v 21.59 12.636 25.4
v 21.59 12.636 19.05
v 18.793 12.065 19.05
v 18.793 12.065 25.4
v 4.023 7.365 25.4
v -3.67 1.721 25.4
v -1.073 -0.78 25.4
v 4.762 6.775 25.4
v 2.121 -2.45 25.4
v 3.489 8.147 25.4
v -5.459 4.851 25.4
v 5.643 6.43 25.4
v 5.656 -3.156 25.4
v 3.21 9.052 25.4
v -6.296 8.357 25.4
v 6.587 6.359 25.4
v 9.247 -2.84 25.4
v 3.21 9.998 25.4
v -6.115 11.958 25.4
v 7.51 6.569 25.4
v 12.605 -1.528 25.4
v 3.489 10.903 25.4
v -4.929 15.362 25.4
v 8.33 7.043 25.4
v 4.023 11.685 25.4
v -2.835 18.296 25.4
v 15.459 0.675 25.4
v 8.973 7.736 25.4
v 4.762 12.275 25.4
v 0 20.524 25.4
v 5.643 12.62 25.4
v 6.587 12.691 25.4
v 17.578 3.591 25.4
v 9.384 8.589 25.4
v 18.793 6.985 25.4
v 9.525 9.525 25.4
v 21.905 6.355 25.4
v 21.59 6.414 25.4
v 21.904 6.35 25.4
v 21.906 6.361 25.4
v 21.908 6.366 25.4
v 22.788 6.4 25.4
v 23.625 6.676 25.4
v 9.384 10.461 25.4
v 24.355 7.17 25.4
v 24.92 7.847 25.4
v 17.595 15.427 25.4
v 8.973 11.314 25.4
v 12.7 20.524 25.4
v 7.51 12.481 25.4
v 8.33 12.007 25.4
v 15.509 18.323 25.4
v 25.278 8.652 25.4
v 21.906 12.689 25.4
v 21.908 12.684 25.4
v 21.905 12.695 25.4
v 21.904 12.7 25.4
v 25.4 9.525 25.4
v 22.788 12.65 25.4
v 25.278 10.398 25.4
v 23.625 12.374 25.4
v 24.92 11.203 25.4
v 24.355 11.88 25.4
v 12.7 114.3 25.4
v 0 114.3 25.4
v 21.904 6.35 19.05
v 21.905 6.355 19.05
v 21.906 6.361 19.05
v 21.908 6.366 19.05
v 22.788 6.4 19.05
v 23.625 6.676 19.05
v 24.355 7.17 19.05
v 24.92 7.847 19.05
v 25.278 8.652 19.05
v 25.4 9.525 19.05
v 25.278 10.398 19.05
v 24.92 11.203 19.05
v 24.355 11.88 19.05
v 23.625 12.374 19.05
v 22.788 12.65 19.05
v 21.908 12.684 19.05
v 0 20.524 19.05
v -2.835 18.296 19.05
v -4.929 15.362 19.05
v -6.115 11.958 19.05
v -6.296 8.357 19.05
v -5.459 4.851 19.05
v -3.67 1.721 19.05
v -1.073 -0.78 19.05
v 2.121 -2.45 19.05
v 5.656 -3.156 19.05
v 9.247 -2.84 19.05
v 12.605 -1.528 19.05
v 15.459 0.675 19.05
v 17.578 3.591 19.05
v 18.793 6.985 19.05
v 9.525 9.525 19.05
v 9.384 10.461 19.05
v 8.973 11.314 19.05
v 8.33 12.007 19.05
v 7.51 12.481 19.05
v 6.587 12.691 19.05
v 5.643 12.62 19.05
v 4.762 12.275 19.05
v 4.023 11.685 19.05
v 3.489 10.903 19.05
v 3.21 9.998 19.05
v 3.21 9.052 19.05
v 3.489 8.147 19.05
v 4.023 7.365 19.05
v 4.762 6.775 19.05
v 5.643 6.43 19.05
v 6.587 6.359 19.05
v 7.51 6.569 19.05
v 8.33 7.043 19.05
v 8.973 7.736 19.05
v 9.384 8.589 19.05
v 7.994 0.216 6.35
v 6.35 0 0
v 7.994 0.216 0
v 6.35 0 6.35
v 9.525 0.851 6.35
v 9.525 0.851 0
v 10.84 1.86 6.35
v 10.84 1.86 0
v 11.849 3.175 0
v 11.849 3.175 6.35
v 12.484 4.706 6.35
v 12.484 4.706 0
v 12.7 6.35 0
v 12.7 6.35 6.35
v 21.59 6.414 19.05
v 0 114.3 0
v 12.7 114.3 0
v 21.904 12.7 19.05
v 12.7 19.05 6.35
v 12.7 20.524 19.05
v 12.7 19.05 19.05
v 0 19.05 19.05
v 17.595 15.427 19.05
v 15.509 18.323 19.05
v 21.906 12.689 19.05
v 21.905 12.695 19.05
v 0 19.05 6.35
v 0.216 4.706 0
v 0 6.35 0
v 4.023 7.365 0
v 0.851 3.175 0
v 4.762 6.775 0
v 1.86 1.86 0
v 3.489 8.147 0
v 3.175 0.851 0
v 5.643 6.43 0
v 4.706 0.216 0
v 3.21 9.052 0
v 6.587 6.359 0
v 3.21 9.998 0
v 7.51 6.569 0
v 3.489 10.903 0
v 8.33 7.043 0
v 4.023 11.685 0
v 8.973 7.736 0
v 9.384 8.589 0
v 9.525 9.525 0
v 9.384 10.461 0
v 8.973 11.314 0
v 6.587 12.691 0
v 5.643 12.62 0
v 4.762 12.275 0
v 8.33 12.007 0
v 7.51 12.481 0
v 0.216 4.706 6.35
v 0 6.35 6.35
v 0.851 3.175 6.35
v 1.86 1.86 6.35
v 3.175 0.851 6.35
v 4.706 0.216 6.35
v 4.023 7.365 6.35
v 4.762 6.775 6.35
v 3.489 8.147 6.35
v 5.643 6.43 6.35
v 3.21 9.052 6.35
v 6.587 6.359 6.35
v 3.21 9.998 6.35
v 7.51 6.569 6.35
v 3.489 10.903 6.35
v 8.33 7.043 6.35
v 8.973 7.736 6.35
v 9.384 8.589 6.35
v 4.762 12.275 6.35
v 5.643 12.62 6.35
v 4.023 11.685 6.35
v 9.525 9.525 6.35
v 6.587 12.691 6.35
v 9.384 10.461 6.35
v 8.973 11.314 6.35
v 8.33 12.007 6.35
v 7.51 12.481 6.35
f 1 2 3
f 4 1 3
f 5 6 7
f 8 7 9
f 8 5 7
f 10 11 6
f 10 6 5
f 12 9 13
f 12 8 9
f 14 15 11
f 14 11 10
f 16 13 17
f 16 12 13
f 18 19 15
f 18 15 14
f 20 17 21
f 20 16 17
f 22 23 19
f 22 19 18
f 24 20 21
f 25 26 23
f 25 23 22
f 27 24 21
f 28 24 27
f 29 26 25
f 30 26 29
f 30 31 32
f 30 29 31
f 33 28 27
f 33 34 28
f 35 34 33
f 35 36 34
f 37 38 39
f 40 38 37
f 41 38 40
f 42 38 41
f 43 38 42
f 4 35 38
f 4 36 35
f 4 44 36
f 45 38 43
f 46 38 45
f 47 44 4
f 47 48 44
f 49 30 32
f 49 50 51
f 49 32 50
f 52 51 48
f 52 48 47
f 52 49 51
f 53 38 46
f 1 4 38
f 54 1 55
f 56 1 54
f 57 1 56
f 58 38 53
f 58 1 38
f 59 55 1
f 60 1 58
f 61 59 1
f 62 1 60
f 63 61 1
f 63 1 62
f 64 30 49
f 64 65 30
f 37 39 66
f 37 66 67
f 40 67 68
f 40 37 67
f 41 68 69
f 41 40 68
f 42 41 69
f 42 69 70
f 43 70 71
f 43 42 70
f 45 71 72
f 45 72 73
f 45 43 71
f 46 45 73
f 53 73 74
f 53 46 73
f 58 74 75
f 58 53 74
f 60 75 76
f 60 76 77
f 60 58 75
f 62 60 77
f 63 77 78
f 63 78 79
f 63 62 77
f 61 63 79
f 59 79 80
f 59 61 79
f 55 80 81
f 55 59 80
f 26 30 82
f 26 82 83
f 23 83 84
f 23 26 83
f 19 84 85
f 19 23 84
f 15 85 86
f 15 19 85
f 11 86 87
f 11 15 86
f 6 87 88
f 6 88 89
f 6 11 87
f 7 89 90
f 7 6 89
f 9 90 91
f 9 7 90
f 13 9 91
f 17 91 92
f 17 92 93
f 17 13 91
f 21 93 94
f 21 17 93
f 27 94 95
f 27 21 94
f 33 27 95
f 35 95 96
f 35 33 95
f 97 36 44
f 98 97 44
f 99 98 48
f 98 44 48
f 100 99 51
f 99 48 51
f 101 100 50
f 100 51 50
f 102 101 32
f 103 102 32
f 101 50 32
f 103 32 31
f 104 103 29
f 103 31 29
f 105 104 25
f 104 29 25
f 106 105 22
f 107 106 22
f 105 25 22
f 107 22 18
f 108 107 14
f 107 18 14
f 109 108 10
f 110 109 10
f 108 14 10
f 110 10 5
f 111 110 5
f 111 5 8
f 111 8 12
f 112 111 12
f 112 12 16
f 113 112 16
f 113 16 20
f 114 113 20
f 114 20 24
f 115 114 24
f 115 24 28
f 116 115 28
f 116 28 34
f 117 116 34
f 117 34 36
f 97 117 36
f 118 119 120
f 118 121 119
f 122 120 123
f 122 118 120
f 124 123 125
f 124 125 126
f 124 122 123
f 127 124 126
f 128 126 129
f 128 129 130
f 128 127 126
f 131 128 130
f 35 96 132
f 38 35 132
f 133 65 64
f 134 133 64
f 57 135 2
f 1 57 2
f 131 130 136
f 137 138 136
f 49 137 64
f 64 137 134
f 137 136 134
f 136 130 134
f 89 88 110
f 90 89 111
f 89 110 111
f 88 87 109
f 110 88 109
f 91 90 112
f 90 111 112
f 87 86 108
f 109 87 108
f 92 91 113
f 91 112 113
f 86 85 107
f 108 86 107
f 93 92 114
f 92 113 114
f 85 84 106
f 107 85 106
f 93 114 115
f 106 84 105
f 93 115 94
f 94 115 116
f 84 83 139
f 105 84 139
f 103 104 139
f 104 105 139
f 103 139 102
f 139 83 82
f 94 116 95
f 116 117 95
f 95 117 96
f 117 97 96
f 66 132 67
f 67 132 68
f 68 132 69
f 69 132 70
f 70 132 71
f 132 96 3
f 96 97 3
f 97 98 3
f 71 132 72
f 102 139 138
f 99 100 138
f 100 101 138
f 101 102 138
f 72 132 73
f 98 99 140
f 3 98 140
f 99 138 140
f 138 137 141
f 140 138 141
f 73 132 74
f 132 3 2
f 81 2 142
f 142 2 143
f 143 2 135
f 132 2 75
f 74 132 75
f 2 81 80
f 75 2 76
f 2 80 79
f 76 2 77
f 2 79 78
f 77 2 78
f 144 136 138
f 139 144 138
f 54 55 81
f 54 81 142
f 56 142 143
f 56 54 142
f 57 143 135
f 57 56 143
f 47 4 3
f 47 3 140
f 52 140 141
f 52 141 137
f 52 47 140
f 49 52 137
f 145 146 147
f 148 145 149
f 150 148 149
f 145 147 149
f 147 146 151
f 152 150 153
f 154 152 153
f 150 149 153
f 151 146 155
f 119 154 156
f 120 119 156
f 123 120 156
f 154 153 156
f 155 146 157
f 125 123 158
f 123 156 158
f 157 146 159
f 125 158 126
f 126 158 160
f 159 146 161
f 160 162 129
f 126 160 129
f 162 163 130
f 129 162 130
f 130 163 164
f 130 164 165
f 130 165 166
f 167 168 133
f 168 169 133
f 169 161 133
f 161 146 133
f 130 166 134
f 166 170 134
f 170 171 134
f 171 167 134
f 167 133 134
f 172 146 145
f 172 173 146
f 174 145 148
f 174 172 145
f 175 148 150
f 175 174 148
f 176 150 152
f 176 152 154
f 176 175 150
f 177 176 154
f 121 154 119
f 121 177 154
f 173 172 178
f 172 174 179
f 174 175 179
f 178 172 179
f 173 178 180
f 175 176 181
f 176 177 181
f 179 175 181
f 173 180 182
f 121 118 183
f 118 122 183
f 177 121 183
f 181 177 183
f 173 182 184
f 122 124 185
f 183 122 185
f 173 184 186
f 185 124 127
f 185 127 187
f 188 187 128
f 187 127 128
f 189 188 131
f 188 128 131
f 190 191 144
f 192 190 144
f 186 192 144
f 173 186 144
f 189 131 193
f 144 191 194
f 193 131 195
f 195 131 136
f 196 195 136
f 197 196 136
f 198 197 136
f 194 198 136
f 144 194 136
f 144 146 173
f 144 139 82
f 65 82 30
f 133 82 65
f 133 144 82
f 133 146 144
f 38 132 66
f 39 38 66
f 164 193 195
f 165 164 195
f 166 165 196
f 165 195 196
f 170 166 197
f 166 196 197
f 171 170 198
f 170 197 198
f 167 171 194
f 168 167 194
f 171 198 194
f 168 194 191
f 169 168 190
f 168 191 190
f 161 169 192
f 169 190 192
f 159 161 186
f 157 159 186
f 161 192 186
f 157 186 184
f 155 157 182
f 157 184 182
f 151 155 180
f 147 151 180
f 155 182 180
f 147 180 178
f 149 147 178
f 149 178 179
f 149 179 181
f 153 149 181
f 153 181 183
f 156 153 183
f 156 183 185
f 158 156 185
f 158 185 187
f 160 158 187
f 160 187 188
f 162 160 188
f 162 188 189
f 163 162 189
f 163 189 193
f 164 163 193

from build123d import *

# Parameters (mm, degrees)
F0_W      = 12.7
F0_H      = 114.3
F1_DEPTH  = 25.4
F2_W      = 19.05
F2_H      = 12.7
F3_DEPTH  = 12.701
F4_R      = 6.34999
F5_R      = 3.175
F6_DEPTH  = 25.401
F8_DEPTH  = 6.35
F10_DEPTH = 6.35


# Not quite as in the source:
# - a fillet or chamfer is up to 0.001 mm smaller than in the source, because OpenCascade refuses the exact size


with BuildPart() as f1:
    # F0 (on Top) → F1 (new body)
    with BuildSketch(Plane.XY):
        with Locations((6.35, 57.15)):
            Rectangle(F0_W, F0_H)
    extrude(amount=F1_DEPTH)

    # F2 (on face) → F3 (cut, through all)
    with BuildSketch(Plane.YZ.offset(12.7)):
        with Locations((9.525, 12.7)):
            Rectangle(F2_W, F2_H)
    extrude(amount=-F3_DEPTH, mode=Mode.SUBTRACT)

    # F4 (radius 6.35 in the source; OpenCascade refuses exactly that, so slightly less here)
    f4_edges = [f1.edges().sort_by_distance(p)[0] for p in [
        (12.7, 0, 22.225),
        (12.7, 0, 3.175),
        (0, 0, 3.175),
        (0, 0, 22.225),
    ]]
    fillet(f4_edges, radius=F4_R)

    # F5 (on face) → F6 (cut, through all)
    with BuildSketch(Plane.XY.offset(25.4)):
        with Locations((6.35, 9.525)):
            Circle(F5_R)
    extrude(amount=-F6_DEPTH, mode=Mode.SUBTRACT)

    # F7 (on face) → F8 (join, through all)
    with BuildSketch(Plane.XY.offset(25.4)):
        with BuildLine():
            Line((0, 6.35), (0, 20.5235226281))
            ThreePointArc((0, 20.5235226281), (6.35, -3.175), (12.7, 20.5235226281))
            Line((12.7, 20.5235226281), (12.7, 6.35))
            ThreePointArc((12.7, 6.35), (6.35, 0), (0, 6.35))
        make_face()
    extrude(amount=-F8_DEPTH)

    # F9 (on face) → F10 (join, through all)
    with BuildSketch(Plane.XY.offset(25.4)):
        with BuildLine():
            ThreePointArc((21.59, 12.6358519733), (21.7481397779, 12.663985398), (21.9075, 12.6840851128))
            ThreePointArc((21.9075, 12.6840851128), (21.9058819686, 12.6920429708), (21.9042598667, 12.7))
            Line((21.9042598667, 12.7), (21.59, 12.6358519733))
        make_face()
        with BuildLine():
            ThreePointArc((21.9075, 6.3659148872), (25.4, 9.525), (21.9075, 12.6840851128))
            ThreePointArc((21.9075, 12.6840851128), (21.7481397779, 12.663985398), (21.59, 12.6358519733))
            Line((21.59, 12.6358519733), (18.7934078933, 12.065))
            ThreePointArc((18.7934078933, 12.065), (19.05, 9.525), (18.7934078933, 6.985))
            Line((18.7934078933, 6.985), (21.59, 6.4141480267))
            ThreePointArc((21.59, 6.4141480267), (21.7481397779, 6.386014602), (21.9075, 6.3659148872))
        make_face()
        with BuildLine():
            ThreePointArc((21.9042598667, 6.35), (21.9058819686, 6.3579570292), (21.9075, 6.3659148872))
            ThreePointArc((21.9075, 6.3659148872), (21.7481397779, 6.386014602), (21.59, 6.4141480267))
            Line((21.59, 6.4141480267), (21.9042598667, 6.35))
        make_face()
    extrude(amount=-F10_DEPTH)


solid = f1.part
